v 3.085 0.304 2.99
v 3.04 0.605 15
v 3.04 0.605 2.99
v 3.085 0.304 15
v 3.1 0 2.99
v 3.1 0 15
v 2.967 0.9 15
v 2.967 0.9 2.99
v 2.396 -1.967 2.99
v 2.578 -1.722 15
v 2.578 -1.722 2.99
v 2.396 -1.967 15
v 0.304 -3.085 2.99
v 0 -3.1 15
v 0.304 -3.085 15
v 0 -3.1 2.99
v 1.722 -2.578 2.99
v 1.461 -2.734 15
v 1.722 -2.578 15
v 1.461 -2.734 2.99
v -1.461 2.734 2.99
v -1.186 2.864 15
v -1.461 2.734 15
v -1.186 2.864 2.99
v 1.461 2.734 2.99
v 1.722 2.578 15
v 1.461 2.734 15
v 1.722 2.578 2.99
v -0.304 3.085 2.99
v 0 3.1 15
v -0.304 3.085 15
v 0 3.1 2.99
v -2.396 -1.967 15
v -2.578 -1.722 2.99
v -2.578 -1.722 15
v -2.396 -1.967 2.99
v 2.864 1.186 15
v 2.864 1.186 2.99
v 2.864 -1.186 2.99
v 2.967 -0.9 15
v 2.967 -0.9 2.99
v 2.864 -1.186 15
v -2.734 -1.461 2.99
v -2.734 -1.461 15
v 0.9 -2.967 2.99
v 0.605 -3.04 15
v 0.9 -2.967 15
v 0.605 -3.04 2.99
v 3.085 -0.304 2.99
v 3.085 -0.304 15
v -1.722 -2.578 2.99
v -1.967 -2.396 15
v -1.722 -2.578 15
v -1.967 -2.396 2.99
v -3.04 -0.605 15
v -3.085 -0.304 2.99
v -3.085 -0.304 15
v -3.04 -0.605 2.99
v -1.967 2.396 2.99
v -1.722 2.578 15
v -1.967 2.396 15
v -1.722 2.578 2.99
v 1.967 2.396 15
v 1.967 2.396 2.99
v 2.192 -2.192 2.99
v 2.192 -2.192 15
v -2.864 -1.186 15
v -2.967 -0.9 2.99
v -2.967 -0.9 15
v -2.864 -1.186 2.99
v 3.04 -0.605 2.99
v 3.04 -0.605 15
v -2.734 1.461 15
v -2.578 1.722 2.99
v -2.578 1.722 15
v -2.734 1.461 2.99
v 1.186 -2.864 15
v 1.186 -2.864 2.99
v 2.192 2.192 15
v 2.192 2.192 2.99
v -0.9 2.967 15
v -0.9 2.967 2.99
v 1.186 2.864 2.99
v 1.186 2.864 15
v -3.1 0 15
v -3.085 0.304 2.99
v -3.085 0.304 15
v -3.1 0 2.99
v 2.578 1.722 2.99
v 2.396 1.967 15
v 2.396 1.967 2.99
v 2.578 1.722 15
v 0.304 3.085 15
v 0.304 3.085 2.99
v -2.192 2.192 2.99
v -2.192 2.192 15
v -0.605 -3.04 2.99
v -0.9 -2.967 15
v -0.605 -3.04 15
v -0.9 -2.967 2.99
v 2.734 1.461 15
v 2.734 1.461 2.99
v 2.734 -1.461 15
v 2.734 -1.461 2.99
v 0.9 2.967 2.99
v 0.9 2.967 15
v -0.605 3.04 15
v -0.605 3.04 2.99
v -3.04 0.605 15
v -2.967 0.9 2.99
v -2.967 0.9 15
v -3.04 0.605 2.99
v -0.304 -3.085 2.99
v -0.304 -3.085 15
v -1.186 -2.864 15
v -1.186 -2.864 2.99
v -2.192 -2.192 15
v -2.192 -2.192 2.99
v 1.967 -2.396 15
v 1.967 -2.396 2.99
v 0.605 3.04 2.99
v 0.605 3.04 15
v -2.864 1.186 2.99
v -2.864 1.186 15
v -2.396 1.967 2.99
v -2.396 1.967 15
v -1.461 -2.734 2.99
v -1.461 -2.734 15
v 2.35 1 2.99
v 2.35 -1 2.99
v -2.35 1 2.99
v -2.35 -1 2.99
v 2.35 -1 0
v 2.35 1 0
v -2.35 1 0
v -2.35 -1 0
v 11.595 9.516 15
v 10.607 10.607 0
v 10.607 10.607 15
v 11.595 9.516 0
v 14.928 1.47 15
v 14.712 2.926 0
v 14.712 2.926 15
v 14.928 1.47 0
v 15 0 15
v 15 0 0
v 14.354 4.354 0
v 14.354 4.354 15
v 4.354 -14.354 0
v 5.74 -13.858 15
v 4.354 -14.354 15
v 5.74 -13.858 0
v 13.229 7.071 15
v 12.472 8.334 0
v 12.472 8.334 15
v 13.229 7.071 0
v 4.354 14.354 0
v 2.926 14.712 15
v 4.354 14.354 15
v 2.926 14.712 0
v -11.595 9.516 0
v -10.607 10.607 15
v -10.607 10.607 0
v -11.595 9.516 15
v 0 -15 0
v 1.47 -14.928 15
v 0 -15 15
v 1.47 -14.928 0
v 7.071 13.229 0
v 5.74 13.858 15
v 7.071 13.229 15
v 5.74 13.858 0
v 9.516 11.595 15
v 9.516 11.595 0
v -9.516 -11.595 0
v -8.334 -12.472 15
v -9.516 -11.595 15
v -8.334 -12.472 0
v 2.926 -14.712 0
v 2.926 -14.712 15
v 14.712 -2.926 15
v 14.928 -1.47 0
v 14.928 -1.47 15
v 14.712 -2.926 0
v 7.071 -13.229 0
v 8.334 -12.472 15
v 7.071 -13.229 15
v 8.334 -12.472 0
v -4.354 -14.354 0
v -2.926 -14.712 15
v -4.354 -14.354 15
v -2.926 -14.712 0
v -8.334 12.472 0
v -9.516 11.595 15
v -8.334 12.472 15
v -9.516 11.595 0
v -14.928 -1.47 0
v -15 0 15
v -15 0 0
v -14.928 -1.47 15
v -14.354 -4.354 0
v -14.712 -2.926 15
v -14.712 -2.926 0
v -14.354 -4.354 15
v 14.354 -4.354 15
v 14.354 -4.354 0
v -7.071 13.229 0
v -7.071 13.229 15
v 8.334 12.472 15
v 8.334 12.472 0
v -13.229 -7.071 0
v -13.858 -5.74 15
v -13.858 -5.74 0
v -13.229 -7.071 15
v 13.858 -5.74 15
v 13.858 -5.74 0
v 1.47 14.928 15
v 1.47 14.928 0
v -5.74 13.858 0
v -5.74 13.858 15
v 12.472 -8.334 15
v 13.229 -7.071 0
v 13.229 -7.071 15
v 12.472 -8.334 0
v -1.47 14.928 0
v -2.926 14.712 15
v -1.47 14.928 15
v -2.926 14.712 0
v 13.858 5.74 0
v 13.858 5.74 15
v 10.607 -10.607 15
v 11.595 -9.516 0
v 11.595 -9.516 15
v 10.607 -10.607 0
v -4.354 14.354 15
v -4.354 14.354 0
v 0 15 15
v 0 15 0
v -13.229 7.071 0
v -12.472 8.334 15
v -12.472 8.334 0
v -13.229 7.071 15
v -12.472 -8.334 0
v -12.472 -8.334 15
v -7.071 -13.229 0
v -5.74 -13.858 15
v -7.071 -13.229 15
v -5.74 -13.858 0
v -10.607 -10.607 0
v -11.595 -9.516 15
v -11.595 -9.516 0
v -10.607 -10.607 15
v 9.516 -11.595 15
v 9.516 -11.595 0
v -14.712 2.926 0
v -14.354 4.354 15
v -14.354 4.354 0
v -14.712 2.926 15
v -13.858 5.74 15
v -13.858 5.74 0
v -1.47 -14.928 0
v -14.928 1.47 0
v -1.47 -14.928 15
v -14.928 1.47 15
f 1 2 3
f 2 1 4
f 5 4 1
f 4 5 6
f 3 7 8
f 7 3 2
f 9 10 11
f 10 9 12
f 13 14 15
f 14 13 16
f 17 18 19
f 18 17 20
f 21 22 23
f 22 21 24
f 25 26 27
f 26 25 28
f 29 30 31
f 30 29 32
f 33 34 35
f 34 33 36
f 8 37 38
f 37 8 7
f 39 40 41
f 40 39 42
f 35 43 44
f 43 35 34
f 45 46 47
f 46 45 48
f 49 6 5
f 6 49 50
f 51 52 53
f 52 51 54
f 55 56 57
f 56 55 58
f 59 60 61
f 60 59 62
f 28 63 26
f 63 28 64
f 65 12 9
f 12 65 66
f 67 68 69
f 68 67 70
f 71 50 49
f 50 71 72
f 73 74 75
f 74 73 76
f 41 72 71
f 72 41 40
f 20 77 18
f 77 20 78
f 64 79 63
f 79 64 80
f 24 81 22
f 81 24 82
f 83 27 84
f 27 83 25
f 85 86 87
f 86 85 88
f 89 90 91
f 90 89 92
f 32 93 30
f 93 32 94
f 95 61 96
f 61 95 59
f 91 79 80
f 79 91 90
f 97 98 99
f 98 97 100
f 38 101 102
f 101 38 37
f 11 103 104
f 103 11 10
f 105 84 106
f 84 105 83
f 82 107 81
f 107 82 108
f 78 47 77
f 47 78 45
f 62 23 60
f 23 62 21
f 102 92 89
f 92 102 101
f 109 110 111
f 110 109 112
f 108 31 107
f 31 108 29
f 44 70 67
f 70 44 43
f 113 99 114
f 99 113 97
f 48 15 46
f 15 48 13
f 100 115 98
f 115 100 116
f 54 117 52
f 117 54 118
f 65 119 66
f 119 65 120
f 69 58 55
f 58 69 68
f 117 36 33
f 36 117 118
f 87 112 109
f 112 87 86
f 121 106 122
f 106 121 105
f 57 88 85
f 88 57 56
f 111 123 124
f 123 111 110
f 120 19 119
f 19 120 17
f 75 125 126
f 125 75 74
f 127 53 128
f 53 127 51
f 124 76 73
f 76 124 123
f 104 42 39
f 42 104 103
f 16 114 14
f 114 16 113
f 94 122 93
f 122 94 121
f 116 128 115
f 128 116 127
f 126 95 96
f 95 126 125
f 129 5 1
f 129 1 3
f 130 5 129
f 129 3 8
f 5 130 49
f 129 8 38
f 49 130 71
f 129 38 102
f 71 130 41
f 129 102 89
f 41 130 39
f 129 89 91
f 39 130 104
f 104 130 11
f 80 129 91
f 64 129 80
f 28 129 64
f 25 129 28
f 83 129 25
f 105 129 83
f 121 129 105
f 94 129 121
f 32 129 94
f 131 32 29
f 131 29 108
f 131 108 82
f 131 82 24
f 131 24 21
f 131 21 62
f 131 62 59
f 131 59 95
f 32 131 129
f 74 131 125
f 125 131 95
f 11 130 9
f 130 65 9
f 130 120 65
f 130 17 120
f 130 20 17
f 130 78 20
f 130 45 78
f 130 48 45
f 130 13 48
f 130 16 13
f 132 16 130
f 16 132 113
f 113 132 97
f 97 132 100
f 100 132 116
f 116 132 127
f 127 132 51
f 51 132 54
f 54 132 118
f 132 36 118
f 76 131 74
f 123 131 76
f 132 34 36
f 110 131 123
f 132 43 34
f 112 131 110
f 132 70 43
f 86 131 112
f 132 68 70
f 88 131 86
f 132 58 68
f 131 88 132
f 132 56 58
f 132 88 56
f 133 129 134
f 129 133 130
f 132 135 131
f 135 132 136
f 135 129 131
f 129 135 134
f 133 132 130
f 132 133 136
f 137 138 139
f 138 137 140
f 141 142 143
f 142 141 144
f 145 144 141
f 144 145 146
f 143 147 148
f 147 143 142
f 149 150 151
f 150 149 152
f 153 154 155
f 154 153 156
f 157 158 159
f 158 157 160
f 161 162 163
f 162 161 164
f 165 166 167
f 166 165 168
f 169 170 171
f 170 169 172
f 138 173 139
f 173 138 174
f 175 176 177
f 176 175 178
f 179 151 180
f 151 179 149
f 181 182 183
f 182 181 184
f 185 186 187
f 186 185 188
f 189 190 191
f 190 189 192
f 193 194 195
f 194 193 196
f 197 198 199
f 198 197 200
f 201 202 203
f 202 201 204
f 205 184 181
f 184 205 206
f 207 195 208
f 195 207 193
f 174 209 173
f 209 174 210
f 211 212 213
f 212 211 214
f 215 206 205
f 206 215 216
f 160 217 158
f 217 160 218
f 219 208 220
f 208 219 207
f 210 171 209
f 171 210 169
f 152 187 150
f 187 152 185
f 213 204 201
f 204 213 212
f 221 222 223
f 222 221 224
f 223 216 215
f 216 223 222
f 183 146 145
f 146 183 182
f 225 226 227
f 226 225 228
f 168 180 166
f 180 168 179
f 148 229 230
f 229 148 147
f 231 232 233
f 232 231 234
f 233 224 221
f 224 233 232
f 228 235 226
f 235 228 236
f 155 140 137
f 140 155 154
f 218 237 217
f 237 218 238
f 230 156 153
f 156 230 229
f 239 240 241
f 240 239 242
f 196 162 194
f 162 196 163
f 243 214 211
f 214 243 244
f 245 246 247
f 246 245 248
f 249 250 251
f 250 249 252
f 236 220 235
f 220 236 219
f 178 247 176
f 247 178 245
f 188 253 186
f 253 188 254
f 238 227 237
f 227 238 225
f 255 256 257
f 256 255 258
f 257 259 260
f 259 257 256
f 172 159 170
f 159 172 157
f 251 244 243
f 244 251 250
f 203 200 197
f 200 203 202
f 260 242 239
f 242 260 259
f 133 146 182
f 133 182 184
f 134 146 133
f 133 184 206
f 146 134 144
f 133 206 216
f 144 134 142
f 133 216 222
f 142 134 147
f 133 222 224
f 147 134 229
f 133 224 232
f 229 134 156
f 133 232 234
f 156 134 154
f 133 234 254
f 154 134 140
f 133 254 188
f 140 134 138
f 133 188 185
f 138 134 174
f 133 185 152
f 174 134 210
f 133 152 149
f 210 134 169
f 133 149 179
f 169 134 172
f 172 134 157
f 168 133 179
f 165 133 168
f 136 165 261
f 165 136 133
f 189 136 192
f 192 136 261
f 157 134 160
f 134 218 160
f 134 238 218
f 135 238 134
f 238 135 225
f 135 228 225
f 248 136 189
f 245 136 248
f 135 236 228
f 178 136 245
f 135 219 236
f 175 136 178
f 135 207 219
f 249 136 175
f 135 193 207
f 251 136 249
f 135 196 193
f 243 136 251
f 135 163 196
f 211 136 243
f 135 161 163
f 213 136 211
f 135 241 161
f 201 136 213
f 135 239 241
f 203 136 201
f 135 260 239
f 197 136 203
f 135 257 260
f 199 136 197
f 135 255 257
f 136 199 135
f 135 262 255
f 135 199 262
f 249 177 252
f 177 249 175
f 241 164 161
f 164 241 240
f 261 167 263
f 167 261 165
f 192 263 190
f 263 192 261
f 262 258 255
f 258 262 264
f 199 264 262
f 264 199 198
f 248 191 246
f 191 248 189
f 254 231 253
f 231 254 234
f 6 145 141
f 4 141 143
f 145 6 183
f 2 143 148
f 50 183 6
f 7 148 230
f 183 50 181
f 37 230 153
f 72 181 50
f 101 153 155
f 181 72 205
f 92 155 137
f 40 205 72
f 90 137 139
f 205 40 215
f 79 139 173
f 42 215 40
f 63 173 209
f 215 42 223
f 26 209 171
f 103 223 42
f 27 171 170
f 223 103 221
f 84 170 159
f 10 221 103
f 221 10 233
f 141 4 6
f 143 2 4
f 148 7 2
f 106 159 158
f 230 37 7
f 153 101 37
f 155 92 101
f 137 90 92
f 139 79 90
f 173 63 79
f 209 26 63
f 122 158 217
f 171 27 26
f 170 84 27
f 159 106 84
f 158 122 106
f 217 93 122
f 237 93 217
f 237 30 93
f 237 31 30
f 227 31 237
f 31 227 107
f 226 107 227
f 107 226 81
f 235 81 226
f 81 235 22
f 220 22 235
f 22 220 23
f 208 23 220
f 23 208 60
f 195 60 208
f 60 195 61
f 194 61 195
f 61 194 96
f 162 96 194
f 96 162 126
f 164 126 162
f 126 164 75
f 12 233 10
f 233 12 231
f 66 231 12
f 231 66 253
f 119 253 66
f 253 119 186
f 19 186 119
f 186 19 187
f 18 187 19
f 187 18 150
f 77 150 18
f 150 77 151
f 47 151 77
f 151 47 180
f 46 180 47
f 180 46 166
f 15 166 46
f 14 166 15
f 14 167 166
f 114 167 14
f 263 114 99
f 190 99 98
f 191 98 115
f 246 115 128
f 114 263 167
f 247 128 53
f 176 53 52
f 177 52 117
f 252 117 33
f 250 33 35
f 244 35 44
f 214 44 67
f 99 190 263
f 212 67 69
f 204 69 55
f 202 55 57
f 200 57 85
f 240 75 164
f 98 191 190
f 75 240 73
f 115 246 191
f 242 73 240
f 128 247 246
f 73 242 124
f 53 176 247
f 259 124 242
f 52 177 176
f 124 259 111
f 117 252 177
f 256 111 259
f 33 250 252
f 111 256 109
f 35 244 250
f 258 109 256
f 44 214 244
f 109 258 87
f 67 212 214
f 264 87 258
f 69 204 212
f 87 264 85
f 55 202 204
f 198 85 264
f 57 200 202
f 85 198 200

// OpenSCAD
// Built by bench/smallmodels/features/compiler.py from a list of features.
$fn = 64;
difference() {
  union() {
    translate([0, 0, 0]) cylinder(d = 30, h = 15);
  }
  union() {
    translate([0, 0, 2.99]) rotate([0, 0, 0]) cylinder(d = 6.2, h = 12.02);
    translate([0, 0, -1]) rotate([0, 0, 0]) translate([-2.35, -1, 0]) cube([4.7, 2, 15]);
  }
}
